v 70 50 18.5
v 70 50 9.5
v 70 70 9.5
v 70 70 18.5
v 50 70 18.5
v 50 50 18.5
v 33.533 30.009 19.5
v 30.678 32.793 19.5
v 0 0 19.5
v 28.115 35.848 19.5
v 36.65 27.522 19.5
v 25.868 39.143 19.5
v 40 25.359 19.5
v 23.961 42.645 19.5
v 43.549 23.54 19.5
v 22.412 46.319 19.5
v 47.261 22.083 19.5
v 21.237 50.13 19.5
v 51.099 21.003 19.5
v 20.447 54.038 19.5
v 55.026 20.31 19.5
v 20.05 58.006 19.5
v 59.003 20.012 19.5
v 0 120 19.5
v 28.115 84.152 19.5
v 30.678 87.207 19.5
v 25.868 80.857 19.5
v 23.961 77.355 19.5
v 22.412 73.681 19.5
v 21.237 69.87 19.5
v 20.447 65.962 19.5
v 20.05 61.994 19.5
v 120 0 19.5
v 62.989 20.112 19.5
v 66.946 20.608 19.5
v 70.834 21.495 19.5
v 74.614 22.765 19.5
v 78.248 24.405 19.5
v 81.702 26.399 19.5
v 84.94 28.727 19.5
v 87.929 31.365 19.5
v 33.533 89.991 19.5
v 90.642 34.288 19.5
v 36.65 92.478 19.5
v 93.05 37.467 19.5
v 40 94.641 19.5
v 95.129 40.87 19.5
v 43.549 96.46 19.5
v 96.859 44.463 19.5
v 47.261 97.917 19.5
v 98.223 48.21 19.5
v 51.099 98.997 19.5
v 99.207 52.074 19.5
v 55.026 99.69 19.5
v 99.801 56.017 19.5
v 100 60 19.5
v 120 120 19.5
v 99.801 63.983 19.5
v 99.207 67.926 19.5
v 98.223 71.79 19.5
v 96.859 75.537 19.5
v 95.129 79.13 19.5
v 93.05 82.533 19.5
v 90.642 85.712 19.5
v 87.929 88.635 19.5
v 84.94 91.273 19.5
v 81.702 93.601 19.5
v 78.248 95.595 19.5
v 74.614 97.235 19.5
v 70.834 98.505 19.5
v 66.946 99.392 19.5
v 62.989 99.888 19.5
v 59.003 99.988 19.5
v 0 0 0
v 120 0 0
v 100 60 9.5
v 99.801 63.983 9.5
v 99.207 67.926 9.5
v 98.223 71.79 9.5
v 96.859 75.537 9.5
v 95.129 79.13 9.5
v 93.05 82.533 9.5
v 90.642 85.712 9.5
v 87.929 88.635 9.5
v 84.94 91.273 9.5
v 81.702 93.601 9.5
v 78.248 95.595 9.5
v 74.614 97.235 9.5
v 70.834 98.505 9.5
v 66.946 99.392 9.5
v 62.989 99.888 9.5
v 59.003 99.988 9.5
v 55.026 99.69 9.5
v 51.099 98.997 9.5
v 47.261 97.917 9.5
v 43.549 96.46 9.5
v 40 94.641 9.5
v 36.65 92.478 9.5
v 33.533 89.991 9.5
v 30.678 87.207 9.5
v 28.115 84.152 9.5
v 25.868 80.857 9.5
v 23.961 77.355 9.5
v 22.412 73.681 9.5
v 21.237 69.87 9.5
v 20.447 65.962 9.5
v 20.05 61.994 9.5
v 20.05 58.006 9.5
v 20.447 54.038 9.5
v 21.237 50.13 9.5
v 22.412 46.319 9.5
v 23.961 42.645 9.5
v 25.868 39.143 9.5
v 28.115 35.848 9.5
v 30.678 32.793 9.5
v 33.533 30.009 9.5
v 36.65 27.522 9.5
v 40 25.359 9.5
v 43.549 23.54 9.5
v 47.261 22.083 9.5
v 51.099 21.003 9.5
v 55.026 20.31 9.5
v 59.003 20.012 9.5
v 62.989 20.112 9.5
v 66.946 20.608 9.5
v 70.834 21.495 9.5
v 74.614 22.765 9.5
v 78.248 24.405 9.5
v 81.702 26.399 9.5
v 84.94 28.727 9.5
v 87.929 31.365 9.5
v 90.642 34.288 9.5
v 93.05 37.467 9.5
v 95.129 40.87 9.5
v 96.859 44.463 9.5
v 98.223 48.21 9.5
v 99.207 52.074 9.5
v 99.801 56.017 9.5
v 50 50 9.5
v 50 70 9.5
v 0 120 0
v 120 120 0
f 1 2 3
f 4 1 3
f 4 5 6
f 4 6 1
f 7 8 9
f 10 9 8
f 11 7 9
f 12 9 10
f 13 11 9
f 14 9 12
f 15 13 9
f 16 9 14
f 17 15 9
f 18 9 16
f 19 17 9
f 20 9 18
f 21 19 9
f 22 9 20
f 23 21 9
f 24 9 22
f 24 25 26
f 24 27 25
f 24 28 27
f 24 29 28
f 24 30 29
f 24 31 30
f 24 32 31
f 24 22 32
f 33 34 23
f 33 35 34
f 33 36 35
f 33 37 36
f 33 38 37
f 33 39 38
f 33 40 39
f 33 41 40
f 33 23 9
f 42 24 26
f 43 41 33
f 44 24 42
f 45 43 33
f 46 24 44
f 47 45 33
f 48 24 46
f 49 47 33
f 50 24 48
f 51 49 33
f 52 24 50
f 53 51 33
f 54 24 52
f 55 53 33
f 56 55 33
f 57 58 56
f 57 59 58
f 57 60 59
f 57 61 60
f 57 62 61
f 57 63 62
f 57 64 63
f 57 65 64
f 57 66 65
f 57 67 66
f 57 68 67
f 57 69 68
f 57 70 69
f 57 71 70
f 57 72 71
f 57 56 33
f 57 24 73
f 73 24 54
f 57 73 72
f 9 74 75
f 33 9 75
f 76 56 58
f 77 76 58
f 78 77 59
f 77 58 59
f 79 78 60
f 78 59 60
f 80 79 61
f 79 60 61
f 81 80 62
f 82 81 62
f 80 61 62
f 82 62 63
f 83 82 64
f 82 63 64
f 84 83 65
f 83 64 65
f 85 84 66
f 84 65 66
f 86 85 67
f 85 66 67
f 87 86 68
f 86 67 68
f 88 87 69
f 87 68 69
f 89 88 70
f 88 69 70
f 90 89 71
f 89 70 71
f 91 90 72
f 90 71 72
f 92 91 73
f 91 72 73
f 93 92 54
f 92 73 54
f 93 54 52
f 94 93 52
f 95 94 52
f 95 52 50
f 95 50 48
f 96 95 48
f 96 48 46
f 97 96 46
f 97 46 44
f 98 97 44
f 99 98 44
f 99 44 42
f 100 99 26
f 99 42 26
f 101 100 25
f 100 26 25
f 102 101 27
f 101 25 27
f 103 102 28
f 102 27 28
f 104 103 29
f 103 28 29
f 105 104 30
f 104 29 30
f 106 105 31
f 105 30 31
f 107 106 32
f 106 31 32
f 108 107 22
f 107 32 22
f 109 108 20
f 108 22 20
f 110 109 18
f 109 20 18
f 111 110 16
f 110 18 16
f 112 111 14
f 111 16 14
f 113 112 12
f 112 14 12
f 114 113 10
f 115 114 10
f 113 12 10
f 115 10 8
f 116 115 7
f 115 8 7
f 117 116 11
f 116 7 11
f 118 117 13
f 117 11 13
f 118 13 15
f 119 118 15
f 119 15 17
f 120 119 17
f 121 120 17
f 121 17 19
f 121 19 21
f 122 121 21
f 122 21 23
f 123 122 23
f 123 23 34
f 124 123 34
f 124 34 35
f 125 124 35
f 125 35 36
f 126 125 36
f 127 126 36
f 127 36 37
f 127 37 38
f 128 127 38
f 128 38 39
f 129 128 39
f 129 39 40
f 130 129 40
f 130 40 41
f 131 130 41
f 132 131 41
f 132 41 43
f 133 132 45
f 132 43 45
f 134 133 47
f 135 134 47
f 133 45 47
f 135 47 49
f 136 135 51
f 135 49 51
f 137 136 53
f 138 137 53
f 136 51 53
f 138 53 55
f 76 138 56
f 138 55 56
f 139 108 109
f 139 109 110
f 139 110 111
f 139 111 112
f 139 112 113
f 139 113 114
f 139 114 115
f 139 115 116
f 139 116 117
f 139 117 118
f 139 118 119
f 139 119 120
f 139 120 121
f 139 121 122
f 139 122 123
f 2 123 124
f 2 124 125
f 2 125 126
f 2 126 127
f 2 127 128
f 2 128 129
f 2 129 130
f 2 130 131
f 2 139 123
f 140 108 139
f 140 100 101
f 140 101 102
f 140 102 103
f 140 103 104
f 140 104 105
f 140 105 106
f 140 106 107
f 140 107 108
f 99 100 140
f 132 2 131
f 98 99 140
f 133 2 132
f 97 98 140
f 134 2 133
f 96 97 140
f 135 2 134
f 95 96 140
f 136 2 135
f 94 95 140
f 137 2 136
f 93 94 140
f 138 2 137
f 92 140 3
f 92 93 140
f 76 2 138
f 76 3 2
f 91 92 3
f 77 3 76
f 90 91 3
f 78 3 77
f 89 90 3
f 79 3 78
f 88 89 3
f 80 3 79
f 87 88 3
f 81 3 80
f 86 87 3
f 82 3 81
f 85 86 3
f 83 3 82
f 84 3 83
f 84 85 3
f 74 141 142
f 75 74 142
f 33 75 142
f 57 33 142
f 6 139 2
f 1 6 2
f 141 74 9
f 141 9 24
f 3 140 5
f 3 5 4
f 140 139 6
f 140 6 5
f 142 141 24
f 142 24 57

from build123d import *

# Parameters (mm, degrees)
F0_W     = 120
F0_H     = 120
F1_DEPTH = 19.5
F2_R     = 40
F3_DEPTH = 10
F4_W     = 20
F4_H     = 20
F6_DEPTH = 9


with BuildPart() as f1:
    # F0 (on Top) → F1 (new body)
    with BuildSketch(Plane.XY):
        with Locations((60, 60)):
            Rectangle(F0_W, F0_H)
    extrude(amount=F1_DEPTH)

    # F2 (on face) → F3 (cut)
    with BuildSketch(Plane.XY.offset(19.5)):
        with Locations((60, 60)):
            Circle(F2_R)
    extrude(amount=-F3_DEPTH, mode=Mode.SUBTRACT)

    # F4 (on face) → F6 (join)
    with BuildSketch(Plane.XY.offset(9.5)):
        with Locations((60, 60)):
            Rectangle(F4_W, F4_H)
    extrude(amount=F6_DEPTH)


solid = f1.part
